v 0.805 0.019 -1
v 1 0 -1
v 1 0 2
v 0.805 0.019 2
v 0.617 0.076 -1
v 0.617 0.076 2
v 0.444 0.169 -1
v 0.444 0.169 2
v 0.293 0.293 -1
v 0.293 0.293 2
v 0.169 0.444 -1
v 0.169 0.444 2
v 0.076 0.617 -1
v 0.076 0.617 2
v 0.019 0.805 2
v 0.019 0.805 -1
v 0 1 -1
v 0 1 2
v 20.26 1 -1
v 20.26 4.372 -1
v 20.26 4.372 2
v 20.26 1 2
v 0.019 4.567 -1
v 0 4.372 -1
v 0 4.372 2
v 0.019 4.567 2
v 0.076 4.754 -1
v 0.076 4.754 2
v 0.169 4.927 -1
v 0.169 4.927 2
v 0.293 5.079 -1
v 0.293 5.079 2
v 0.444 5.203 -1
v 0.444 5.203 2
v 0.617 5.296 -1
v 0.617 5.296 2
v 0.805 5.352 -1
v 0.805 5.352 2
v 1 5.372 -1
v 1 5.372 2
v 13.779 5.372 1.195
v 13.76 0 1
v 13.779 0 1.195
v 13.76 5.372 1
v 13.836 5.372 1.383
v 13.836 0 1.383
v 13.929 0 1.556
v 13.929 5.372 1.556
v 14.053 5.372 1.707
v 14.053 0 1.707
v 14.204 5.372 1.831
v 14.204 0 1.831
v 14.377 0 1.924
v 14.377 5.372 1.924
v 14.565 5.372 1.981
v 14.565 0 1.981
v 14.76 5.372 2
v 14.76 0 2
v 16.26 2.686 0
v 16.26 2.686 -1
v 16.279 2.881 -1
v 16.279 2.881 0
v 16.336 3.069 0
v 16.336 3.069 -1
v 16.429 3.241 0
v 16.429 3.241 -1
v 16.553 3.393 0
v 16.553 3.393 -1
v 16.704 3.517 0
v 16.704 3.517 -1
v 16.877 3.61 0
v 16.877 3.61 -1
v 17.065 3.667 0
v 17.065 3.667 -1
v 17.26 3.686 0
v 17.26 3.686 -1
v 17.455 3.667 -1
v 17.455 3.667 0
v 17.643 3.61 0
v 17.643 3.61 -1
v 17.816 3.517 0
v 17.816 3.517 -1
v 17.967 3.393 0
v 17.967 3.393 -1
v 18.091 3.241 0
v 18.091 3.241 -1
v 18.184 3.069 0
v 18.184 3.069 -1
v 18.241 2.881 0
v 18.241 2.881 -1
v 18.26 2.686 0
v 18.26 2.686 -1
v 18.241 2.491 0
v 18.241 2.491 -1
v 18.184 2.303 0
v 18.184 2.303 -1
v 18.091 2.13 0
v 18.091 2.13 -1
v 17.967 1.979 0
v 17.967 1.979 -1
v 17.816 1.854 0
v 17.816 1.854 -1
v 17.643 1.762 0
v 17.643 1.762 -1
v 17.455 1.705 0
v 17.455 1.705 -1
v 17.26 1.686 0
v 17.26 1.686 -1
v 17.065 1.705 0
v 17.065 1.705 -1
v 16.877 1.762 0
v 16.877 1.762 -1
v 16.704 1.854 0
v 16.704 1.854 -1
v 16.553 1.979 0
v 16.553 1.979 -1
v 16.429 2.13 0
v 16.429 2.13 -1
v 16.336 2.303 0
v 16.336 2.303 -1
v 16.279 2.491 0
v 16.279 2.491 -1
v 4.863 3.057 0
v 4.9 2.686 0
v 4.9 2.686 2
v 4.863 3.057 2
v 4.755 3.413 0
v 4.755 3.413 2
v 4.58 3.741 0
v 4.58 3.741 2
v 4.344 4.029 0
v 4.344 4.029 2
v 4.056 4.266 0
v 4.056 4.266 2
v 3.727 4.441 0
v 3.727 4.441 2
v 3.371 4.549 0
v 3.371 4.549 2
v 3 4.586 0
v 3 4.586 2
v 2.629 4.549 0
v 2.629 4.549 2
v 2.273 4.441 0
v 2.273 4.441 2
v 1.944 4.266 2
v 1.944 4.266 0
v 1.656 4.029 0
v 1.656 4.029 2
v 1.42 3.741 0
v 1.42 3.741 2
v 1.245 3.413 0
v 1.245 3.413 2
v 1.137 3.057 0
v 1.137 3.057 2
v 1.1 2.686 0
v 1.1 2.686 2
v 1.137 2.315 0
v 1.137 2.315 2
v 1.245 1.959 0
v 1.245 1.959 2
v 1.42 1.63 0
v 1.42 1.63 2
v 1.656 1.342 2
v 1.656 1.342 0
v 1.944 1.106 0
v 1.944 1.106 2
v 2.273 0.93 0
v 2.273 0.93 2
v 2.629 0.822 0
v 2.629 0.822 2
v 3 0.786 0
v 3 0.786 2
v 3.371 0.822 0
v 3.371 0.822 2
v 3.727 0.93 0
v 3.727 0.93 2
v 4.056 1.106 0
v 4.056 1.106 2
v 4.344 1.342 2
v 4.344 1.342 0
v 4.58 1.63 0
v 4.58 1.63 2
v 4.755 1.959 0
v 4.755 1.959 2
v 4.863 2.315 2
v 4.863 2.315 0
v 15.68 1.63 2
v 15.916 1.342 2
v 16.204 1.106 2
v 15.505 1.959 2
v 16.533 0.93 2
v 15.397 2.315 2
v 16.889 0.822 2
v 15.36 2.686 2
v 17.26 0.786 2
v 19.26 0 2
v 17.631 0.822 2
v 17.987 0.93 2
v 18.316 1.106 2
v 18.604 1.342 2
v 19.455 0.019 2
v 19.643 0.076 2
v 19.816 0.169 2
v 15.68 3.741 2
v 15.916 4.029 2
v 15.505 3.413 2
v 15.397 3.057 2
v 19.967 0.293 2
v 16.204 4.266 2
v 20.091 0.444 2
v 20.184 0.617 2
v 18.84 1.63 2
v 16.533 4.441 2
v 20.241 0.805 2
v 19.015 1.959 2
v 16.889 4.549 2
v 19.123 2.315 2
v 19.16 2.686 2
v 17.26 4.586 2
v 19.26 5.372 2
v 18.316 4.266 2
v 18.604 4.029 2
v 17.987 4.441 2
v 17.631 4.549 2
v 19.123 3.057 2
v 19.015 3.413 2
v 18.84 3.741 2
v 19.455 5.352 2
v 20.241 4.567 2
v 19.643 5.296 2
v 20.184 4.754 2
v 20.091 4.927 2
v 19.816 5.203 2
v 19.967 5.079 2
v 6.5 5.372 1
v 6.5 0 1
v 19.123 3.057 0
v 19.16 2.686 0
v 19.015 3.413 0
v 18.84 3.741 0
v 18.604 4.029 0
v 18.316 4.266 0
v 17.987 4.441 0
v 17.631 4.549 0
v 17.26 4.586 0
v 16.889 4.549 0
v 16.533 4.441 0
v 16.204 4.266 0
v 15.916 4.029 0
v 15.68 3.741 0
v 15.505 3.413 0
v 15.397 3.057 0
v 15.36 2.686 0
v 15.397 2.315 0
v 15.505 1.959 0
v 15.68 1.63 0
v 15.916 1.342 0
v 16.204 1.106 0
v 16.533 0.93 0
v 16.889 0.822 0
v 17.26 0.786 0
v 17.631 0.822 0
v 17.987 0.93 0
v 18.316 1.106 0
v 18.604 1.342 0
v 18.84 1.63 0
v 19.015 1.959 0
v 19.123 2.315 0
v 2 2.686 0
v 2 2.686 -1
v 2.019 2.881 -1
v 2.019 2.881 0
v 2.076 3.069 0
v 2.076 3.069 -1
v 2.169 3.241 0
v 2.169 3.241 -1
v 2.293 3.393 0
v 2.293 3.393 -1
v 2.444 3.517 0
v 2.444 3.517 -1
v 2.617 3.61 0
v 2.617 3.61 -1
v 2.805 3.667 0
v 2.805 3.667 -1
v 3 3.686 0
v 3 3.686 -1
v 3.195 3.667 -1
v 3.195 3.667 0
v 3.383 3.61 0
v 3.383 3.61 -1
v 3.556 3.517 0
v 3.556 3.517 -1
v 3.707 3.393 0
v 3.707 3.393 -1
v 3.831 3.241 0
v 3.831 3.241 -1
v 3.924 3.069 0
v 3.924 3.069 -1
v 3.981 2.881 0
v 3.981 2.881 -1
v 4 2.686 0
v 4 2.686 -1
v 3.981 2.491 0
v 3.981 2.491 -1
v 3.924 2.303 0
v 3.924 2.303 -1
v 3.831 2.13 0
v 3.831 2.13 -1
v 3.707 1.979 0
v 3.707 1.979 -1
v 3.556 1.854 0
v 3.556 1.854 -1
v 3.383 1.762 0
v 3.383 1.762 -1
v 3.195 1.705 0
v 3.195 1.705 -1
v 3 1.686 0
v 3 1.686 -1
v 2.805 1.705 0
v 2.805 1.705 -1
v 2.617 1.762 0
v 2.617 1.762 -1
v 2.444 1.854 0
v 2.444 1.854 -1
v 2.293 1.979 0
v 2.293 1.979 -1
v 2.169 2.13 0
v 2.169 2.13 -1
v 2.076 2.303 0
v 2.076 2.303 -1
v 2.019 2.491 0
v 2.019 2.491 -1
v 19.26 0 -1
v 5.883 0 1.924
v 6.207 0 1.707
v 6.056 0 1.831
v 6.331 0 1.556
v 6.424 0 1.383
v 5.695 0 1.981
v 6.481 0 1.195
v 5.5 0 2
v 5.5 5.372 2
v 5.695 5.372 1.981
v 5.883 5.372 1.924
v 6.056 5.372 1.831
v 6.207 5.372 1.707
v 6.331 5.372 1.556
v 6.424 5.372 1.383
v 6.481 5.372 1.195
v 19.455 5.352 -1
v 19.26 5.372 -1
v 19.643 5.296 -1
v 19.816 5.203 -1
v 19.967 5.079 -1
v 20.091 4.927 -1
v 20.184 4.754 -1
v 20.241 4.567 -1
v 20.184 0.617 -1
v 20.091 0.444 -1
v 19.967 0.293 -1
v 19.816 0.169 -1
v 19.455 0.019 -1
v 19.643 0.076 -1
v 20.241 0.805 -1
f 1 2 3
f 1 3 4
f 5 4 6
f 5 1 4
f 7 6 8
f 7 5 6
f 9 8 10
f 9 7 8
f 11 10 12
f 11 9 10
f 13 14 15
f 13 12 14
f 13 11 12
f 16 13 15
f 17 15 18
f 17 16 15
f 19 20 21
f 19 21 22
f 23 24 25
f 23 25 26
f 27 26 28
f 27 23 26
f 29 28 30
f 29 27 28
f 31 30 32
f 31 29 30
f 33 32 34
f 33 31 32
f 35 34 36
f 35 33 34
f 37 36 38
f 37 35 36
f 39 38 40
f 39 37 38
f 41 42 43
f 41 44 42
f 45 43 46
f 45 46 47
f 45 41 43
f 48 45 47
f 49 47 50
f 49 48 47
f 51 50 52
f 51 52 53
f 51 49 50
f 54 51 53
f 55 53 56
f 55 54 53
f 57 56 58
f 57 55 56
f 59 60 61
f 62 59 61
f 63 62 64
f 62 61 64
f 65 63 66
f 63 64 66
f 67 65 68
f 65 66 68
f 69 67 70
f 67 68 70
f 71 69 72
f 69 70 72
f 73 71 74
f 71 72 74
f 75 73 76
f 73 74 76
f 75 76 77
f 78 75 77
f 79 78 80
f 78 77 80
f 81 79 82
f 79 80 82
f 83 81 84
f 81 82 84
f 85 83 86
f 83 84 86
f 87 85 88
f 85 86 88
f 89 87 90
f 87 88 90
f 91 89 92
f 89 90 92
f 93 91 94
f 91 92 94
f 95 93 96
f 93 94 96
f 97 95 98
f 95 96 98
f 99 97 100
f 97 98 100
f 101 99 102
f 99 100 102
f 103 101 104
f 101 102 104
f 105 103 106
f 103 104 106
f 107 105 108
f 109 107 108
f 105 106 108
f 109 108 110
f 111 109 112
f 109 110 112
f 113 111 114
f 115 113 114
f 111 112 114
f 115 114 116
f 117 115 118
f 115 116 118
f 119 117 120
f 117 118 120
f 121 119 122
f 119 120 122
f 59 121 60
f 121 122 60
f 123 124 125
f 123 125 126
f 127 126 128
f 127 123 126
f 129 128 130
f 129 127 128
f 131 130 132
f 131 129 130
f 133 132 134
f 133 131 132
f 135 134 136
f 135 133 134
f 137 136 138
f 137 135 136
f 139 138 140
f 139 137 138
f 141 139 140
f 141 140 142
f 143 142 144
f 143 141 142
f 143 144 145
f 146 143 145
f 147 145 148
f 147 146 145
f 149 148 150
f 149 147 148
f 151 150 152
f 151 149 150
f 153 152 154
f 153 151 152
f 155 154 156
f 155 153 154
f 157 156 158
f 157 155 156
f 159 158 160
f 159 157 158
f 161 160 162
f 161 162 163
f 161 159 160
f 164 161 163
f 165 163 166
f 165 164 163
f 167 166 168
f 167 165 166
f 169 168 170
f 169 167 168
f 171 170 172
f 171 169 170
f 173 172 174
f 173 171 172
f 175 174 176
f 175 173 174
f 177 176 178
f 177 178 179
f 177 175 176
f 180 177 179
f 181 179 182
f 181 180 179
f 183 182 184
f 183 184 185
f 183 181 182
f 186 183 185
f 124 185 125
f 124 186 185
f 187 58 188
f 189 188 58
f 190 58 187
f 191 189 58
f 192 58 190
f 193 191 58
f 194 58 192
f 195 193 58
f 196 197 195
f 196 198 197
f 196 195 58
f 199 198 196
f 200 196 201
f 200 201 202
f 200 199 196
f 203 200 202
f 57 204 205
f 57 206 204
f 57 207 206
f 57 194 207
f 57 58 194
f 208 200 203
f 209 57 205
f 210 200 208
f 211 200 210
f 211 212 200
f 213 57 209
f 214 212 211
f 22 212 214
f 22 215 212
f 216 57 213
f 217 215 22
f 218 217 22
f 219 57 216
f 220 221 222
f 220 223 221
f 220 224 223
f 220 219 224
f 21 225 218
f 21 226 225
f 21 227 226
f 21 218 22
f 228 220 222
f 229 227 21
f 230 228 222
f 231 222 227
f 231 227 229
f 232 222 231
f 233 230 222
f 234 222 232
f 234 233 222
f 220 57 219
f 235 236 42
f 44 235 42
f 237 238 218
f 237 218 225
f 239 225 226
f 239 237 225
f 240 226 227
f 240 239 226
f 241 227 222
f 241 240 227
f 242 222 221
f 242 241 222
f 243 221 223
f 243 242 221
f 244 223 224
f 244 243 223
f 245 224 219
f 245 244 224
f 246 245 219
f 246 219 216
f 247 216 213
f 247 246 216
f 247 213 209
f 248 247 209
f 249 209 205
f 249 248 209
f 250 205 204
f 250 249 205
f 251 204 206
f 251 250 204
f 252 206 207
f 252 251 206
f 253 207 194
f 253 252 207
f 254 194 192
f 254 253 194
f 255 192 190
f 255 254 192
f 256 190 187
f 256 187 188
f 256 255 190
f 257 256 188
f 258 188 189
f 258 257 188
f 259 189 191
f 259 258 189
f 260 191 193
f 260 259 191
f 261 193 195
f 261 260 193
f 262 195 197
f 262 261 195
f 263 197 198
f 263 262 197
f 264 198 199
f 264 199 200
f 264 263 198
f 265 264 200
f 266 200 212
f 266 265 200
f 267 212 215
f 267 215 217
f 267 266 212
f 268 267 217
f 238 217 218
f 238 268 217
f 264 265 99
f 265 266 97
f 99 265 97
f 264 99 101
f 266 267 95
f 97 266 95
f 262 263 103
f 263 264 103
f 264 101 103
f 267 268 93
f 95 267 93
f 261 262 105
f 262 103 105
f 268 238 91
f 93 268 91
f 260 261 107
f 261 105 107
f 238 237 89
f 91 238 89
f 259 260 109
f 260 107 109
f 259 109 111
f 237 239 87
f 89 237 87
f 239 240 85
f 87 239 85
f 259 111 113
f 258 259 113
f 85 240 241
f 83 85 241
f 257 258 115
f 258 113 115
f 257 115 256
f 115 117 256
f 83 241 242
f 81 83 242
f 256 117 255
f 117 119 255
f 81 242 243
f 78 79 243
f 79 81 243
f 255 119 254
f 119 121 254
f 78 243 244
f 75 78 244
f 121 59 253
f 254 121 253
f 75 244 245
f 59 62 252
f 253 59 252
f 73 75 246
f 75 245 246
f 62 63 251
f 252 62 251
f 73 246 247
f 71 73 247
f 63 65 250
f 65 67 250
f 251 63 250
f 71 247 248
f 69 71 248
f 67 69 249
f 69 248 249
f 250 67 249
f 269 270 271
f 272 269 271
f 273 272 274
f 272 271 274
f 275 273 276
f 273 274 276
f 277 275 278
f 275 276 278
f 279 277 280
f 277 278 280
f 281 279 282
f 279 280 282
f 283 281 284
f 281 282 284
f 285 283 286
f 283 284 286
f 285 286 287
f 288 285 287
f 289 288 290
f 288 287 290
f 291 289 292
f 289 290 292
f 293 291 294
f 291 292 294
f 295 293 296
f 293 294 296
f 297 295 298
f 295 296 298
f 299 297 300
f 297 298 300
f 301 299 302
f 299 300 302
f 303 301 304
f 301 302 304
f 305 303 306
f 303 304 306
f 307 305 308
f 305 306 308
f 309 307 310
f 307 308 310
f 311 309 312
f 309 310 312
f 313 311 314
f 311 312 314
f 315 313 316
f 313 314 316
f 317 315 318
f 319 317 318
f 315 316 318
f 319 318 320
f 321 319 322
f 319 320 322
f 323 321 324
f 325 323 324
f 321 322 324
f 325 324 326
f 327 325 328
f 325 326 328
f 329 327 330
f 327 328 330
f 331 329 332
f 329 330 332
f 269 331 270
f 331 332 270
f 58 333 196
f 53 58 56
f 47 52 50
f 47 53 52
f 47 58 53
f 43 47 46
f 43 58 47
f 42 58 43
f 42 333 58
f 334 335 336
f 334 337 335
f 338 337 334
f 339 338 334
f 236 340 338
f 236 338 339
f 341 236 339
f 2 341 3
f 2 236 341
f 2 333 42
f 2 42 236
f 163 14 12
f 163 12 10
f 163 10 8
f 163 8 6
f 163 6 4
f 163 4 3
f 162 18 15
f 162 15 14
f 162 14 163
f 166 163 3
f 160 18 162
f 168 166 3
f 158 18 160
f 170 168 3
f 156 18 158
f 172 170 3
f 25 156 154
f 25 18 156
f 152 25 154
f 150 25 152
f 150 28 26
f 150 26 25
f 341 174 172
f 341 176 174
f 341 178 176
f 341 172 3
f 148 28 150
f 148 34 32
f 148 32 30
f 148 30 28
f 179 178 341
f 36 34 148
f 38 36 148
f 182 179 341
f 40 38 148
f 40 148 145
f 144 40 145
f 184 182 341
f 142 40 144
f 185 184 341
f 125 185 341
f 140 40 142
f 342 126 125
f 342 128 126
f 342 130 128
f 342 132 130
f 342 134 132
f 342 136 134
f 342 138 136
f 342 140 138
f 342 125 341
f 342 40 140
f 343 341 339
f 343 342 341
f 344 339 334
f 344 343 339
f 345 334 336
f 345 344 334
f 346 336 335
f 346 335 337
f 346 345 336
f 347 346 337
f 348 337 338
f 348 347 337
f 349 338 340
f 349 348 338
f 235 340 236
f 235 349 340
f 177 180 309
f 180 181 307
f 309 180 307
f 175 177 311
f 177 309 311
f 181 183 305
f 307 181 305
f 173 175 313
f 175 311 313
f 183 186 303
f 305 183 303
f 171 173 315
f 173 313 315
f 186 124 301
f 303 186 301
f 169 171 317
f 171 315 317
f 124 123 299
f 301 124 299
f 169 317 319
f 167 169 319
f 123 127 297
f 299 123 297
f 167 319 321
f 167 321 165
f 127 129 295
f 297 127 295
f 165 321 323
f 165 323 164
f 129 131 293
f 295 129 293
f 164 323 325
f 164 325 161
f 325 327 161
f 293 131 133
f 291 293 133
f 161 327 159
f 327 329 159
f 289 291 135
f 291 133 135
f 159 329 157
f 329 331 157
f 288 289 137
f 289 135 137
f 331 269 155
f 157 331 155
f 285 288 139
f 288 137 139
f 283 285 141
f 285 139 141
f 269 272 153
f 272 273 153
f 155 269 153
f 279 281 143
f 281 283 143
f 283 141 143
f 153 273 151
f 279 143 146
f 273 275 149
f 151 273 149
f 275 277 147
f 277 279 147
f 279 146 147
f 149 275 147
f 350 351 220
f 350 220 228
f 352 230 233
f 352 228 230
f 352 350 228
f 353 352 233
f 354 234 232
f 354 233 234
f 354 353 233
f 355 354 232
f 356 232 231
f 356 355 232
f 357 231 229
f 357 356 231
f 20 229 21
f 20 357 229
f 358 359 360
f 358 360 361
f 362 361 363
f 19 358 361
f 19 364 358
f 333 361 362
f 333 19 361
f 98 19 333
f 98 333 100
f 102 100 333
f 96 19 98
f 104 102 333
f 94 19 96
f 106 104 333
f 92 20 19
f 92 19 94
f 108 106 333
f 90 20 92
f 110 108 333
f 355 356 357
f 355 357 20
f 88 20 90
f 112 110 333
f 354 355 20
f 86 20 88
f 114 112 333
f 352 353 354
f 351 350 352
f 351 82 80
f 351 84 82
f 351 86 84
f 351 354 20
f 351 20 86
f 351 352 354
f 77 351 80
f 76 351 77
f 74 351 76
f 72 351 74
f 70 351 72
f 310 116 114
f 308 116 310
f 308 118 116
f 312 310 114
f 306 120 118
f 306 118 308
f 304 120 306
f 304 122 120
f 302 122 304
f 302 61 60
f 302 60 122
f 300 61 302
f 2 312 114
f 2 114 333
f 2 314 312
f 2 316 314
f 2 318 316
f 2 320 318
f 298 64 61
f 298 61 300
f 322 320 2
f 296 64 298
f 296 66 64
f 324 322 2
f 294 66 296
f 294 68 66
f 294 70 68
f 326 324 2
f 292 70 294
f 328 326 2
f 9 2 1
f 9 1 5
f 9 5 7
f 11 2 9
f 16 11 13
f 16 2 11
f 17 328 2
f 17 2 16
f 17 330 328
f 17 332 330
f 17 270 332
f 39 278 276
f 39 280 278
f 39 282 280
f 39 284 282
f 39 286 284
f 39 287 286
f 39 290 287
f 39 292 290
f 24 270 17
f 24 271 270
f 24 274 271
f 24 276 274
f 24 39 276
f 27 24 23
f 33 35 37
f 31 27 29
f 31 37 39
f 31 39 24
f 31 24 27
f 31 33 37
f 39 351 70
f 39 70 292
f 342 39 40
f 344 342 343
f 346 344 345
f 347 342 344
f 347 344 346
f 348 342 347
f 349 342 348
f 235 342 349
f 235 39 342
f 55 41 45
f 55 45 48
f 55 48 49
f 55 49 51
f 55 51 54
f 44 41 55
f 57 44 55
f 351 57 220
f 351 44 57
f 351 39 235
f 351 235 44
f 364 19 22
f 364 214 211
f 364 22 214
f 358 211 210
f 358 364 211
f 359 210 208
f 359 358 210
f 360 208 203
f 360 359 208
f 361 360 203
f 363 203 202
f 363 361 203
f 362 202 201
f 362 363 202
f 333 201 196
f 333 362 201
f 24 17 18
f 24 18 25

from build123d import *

# Parameters (mm, degrees)
SKETCH1_R           = 1.9
BOSS_EXTRUDE1_DEPTH = 2
BOSS_EXTRUDE2_START = 1
SKETCH2_R           = 1
BOSS_EXTRUDE2_DEPTH = 1
SKETCH3_W           = 7.26
SKETCH3_H           = 2.991248821
CUT_EXTRUDE1_DEPTH  = 10
FILLET1_R           = 1


with BuildPart() as part:
    # Sketch1 → Boss-Extrude1 (new body)
    with BuildSketch(Plane.XY):
        with BuildLine():
            Line((1, 0), (19.26, 0))
            ThreePointArc((19.26, 0), (19.967106781, 0.292893219), (20.26, 1))
            Line((20.26, 1), (20.26, 4.371699928))
            ThreePointArc((20.26, 4.371699928), (19.967106781, 5.078806709), (19.26, 5.371699928))
            Line((19.26, 5.371699928), (1, 5.371699928))
            ThreePointArc((1, 5.371699928), (0.292893219, 5.078806709), (0, 4.371699928))
            Line((0, 4.371699928), (0, 1))
            ThreePointArc((0, 1), (0.292893219, 0.292893219), (1, 0))
        make_face()
        with Locations((3, 2.685849964)):
            Circle(SKETCH1_R, mode=Mode.SUBTRACT)
        with Locations((17.26, 2.685849964)):
            Circle(SKETCH1_R, mode=Mode.SUBTRACT)
    extrude(amount=BOSS_EXTRUDE1_DEPTH)

    # Sketch2 → Boss-Extrude2 (add)
    with BuildSketch(Plane(origin=(0, 0, 0), x_dir=(-1, 0, 0), z_dir=(0, 0, -1)).offset(BOSS_EXTRUDE2_START)):
        with BuildLine():
            Line((-19.26, 0), (-1, 0))
            ThreePointArc((-1, 0), (-0.292893219, 0.292893219), (0, 1))
            Line((0, 1), (0, 4.371699928))
            ThreePointArc((0, 4.371699928), (-0.292893219, 5.078806709), (-1, 5.371699928))
            Line((-1, 5.371699928), (-19.26, 5.371699928))
            ThreePointArc((-19.26, 5.371699928), (-19.967106781, 5.078806709), (-20.26, 4.371699928))
            Line((-20.26, 4.371699928), (-20.26, 1))
            ThreePointArc((-20.26, 1), (-19.967106781, 0.292893219), (-19.26, 0))
        make_face()
        with Locations((-17.26, 2.685849964)):
            Circle(SKETCH2_R, mode=Mode.SUBTRACT)
        with Locations((-3, 2.685849964)):
            Circle(SKETCH2_R, mode=Mode.SUBTRACT)
    extrude(amount=-BOSS_EXTRUDE2_DEPTH)

    # Sketch3 → Cut-Extrude1 (cut)
    with BuildSketch(Plane.XZ):
        with Locations((10.13, 2.495624411)):
            Rectangle(SKETCH3_W, SKETCH3_H)
    extrude(amount=-CUT_EXTRUDE1_DEPTH, mode=Mode.SUBTRACT)

    # Fillet1
    fillet1_edges = [part.edges().sort_by_distance(p)[0] for p in [
        (13.76, 2.685849964, 2),
        (6.5, 2.685849964, 2),
    ]]
    fillet(fillet1_edges, radius=FILLET1_R - 0.0001)  # a hair under: the kernel refuses the full size


solid = part.part
